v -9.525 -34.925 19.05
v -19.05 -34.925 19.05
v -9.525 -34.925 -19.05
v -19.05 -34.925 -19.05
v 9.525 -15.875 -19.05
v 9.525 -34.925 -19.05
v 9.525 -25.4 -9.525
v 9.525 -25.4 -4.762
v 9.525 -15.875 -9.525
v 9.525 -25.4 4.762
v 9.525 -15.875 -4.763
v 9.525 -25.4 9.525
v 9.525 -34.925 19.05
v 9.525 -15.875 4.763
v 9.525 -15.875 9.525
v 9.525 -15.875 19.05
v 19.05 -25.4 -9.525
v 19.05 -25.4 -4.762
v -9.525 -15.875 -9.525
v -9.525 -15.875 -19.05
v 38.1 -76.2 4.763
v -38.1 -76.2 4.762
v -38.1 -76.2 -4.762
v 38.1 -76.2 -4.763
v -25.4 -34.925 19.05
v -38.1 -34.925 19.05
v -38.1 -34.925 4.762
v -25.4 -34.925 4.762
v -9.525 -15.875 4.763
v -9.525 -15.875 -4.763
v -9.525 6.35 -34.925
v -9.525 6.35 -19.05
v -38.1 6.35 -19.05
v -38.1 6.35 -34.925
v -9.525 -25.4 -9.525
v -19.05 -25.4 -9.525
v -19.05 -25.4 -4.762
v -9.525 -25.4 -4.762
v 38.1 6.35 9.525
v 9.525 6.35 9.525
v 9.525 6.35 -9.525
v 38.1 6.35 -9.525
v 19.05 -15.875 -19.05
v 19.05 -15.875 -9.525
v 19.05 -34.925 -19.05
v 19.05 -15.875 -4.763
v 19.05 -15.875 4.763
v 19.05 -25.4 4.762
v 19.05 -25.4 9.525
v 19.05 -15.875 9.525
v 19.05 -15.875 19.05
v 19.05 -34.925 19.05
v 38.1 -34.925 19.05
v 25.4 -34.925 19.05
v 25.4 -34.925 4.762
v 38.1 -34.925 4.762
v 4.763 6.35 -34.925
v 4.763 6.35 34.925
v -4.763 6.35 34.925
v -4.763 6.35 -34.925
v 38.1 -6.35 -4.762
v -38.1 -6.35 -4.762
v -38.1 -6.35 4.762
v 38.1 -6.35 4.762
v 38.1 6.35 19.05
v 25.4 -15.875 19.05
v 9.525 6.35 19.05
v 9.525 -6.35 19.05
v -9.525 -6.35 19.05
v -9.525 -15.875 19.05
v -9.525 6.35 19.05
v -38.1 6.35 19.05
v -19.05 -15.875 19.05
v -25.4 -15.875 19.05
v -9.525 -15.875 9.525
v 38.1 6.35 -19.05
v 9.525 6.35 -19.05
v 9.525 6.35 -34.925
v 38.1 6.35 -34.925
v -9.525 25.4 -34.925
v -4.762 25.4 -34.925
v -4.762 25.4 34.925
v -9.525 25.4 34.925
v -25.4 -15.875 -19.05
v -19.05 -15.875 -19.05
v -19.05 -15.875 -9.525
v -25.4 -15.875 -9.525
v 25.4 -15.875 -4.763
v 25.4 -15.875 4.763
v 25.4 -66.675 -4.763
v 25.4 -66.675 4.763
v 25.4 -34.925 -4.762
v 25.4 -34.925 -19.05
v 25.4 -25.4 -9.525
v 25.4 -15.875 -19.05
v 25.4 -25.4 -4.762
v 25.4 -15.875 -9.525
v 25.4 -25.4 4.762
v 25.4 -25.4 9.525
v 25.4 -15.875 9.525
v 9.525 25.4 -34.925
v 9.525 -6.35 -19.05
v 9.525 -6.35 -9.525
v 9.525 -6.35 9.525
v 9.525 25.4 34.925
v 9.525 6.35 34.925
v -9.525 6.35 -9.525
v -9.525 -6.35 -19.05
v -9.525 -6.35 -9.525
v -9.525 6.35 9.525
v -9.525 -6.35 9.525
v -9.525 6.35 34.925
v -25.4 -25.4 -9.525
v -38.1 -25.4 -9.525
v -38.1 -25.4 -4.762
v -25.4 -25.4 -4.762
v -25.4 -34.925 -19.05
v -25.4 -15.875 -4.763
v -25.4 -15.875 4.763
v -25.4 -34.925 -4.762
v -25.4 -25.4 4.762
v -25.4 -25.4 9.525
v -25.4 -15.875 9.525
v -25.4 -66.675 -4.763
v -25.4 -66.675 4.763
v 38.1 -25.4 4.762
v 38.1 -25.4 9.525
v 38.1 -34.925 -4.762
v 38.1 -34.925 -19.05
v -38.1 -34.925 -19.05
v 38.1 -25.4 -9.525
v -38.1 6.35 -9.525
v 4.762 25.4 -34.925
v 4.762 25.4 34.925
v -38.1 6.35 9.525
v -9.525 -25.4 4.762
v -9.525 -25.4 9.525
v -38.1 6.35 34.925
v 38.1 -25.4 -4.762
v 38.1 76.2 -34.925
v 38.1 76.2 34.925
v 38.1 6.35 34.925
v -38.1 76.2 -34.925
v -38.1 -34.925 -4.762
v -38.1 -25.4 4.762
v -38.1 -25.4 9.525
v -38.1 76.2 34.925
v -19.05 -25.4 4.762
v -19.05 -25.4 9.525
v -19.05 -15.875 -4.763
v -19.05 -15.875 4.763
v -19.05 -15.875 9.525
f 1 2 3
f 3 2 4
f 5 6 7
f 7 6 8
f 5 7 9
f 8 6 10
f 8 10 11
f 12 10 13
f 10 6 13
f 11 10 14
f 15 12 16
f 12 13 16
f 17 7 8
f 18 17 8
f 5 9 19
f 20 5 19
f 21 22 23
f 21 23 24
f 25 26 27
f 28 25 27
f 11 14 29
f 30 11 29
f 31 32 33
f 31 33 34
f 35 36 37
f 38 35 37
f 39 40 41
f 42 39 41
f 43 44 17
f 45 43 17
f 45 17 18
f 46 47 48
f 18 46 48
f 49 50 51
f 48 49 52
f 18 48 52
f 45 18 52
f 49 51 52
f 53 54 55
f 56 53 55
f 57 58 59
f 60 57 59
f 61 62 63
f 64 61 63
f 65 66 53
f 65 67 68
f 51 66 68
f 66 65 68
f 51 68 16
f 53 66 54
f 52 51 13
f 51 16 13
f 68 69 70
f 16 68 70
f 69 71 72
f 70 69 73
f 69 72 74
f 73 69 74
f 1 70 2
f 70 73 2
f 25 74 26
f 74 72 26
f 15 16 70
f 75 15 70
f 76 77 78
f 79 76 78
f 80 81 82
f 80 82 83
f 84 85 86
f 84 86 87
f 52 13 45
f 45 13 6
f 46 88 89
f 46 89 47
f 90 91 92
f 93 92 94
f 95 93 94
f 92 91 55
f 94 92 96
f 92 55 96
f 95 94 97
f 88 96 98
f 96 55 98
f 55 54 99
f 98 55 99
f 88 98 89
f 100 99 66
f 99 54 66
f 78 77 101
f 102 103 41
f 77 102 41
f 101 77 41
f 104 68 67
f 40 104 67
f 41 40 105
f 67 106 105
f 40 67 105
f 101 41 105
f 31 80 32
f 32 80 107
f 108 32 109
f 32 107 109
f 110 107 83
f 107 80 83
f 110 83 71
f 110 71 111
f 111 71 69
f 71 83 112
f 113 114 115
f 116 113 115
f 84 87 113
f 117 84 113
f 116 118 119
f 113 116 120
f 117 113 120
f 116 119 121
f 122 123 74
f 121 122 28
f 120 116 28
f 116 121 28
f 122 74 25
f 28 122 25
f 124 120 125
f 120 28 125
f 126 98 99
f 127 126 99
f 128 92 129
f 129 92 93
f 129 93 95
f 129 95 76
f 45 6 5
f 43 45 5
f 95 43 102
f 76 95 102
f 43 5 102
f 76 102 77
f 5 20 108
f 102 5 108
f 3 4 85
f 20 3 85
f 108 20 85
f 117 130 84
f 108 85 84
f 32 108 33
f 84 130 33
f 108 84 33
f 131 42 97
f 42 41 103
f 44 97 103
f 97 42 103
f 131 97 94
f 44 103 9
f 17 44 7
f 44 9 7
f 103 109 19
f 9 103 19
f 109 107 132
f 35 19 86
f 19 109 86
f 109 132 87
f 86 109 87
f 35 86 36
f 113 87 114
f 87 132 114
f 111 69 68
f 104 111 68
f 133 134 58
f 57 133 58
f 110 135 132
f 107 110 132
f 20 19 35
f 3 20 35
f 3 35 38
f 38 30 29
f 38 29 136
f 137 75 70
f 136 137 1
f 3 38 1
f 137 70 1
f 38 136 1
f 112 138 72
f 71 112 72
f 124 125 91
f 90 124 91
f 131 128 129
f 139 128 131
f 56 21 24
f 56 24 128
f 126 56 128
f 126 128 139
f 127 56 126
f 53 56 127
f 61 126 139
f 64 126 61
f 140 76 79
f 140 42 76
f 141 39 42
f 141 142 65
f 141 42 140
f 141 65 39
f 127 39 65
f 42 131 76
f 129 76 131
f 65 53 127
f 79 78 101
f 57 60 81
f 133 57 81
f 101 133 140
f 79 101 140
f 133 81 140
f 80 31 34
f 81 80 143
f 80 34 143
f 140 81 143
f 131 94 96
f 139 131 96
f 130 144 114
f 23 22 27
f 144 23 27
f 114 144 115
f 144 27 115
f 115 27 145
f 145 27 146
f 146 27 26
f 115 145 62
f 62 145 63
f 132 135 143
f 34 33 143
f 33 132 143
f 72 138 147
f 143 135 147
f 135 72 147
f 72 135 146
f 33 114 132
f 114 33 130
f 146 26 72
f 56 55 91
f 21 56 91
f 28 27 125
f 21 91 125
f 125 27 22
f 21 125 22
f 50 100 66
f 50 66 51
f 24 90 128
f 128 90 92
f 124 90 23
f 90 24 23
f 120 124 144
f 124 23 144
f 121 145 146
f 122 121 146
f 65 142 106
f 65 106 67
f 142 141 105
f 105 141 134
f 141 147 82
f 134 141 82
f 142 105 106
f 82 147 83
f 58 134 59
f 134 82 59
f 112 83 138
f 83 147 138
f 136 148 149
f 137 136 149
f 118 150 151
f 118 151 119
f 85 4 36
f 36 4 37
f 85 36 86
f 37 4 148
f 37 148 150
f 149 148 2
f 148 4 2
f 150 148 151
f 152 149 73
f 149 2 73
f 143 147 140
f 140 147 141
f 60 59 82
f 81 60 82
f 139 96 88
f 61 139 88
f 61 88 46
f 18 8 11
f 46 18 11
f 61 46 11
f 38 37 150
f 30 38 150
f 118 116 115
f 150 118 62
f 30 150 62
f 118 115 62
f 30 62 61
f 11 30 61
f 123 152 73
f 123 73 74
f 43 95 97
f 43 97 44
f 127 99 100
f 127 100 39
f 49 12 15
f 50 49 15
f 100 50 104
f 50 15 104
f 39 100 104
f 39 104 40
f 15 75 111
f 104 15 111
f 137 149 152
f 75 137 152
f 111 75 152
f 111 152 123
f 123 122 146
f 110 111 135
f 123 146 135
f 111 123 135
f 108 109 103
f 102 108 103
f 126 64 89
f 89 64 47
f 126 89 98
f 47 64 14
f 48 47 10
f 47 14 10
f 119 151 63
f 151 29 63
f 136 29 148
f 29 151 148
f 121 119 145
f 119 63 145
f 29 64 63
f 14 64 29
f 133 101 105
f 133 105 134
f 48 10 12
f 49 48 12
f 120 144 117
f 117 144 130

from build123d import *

# Parameters (mm, degrees)
F0_W     = 76.2
F0_H     = 152.4
F1_DEPTH = 38.1
F3_DEPTH = 76.201
F5_DEPTH = 76.201
F7_DEPTH = 76.201
F8_DEPTH = 76.201
F9_DEPTH = 73.026


with BuildPart() as f1:
    # F0 (on Top) → F1 (new body, symmetric)
    with BuildSketch(Plane.XY):
        Rectangle(F0_W, F0_H)
    extrude(amount=F1_DEPTH, both=True)

    # F2 (on face) → F3 (cut, through all)
    with BuildSketch(Plane.XY.offset(38.1)):
        Polygon((-9.525, 25.4), (-9.525, -6.35), (9.525, -6.35), (9.525, 25.4), (4.7625, 25.4), (4.7625, 6.35), (-4.7625, 6.35), (-4.7625, 25.4), align=None)
    extrude(amount=-F3_DEPTH, mode=Mode.SUBTRACT)

    # F4 (on face) → F5 (cut, through all)
    with BuildSketch(Plane(origin=(-38.1, 0, 0), x_dir=(0, -1, 0), z_dir=(-1, 0, 0))):
        Polygon((25.4, 9.525), (-6.35, 9.525), (-6.35, -9.525), (25.4, -9.525), (25.4, -4.7625), (6.35, -4.7625), (6.35, 4.7625), (25.4, 4.7625), align=None)
    extrude(amount=-F5_DEPTH, mode=Mode.SUBTRACT)

    # F6 (on face) → F7 (cut, through all)
    with BuildSketch(Plane.XY.offset(38.1)):
        with BuildLine():
            ThreePointArc((9.525, -18.653125), (8.711306, -16.688694), (6.746875, -15.875))
            ThreePointArc((6.746875, -15.875), (4.782444, -20.617556), (9.525, -18.653125))
        make_face()
        with BuildLine():
            ThreePointArc((22.621875, -15.875), (20.657444, -20.617556), (25.4, -18.653125))
            ThreePointArc((25.4, -18.653125), (24.586306, -16.688694), (22.621875, -15.875))
        make_face()
        with BuildLine():
            ThreePointArc((21.997912, -37.697932), (21.123243, -35.674362), (19.05, -34.925))
            ThreePointArc((19.05, -34.925), (17.316332, -39.721502), (21.997912, -37.697932))
        make_face()
        with BuildLine():
            ThreePointArc((10.995796, -37.376299), (10.599886, -35.946954), (9.525, -34.925))
            ThreePointArc((9.525, -34.925), (5.835455, -38.805645), (10.995796, -37.376299))
        make_face()
        with BuildLine():
            ThreePointArc((-5.702395, -37.499304), (-6.928701, -35.194996), (-9.525, -34.925))
            ThreePointArc((-9.525, -34.925), (-10.032339, -39.803612), (-5.702395, -37.499304))
        make_face()
        with BuildLine():
            ThreePointArc((-16.36457, -37.701578), (-17.14576, -35.770198), (-19.05, -34.925))
            ThreePointArc((-19.05, -34.925), (-21.13963, -39.632958), (-16.36457, -37.701578))
        make_face()
        with BuildLine():
            ThreePointArc((-6.746875, -15.875), (-8.711306, -16.688694), (-9.525, -18.653125))
            ThreePointArc((-9.525, -18.653125), (-6.746875, -21.43125), (-3.96875, -18.653125))
            ThreePointArc((-3.96875, -18.653125), (-4.782444, -16.688694), (-6.746875, -15.875))
        make_face()
        with BuildLine():
            ThreePointArc((-22.621875, -15.875), (-24.586306, -16.688694), (-25.4, -18.653125))
            ThreePointArc((-25.4, -18.653125), (-22.621875, -21.43125), (-19.84375, -18.653125))
            ThreePointArc((-19.84375, -18.653125), (-20.657444, -16.688694), (-22.621875, -15.875))
        make_face()
        with BuildLine():
            ThreePointArc((-22.621875, -66.675), (-20.657444, -65.861306), (-19.84375, -63.896875))
            ThreePointArc((-19.84375, -63.896875), (-22.621875, -61.11875), (-25.4, -63.896875))
            ThreePointArc((-25.4, -63.896875), (-24.586306, -65.861306), (-22.621875, -66.675))
        make_face()
        with BuildLine():
            ThreePointArc((25.4, -63.896875), (20.657444, -61.932444), (22.621875, -66.675))
            ThreePointArc((22.621875, -66.675), (24.586306, -65.861306), (25.4, -63.896875))
        make_face()
    extrude(amount=-F7_DEPTH, mode=Mode.SUBTRACT)

    # F4 (on face) → F8 (cut, through all)
    with BuildSketch(Plane(origin=(-38.1, 0, 0), x_dir=(0, -1, 0), z_dir=(-1, 0, 0))):
        Polygon((-76.2, 34.925), (-6.35, 34.925), (-6.35, 19.05), (34.925, 19.05), (34.925, 4.7625), (76.2, 4.7625), (76.2, 38.1), (-76.2, 38.1), align=None)
        Polygon((-6.35, -34.925), (-76.2, -34.925), (-76.2, -38.1), (76.2, -38.1), (76.2, -4.7625), (34.925, -4.7625), (34.925, -19.05), (-6.35, -19.05), align=None)
    extrude(amount=-F8_DEPTH, mode=Mode.SUBTRACT)

    # F2 (on face) → F9 (cut, through all)
    with BuildSketch(Plane.XY.offset(38.1)):
        Polygon((-19.05, -34.925), (-19.05, -15.875), (-25.4, -15.875), (-25.4, -66.675), (25.4, -66.675), (25.4, -15.875), (19.05, -15.875), (19.05, -34.925), (9.525, -34.925), (9.525, -15.875), (-9.525, -15.875), (-9.525, -34.925), align=None)
    extrude(amount=-F9_DEPTH, mode=Mode.SUBTRACT)


solid = f1.part
